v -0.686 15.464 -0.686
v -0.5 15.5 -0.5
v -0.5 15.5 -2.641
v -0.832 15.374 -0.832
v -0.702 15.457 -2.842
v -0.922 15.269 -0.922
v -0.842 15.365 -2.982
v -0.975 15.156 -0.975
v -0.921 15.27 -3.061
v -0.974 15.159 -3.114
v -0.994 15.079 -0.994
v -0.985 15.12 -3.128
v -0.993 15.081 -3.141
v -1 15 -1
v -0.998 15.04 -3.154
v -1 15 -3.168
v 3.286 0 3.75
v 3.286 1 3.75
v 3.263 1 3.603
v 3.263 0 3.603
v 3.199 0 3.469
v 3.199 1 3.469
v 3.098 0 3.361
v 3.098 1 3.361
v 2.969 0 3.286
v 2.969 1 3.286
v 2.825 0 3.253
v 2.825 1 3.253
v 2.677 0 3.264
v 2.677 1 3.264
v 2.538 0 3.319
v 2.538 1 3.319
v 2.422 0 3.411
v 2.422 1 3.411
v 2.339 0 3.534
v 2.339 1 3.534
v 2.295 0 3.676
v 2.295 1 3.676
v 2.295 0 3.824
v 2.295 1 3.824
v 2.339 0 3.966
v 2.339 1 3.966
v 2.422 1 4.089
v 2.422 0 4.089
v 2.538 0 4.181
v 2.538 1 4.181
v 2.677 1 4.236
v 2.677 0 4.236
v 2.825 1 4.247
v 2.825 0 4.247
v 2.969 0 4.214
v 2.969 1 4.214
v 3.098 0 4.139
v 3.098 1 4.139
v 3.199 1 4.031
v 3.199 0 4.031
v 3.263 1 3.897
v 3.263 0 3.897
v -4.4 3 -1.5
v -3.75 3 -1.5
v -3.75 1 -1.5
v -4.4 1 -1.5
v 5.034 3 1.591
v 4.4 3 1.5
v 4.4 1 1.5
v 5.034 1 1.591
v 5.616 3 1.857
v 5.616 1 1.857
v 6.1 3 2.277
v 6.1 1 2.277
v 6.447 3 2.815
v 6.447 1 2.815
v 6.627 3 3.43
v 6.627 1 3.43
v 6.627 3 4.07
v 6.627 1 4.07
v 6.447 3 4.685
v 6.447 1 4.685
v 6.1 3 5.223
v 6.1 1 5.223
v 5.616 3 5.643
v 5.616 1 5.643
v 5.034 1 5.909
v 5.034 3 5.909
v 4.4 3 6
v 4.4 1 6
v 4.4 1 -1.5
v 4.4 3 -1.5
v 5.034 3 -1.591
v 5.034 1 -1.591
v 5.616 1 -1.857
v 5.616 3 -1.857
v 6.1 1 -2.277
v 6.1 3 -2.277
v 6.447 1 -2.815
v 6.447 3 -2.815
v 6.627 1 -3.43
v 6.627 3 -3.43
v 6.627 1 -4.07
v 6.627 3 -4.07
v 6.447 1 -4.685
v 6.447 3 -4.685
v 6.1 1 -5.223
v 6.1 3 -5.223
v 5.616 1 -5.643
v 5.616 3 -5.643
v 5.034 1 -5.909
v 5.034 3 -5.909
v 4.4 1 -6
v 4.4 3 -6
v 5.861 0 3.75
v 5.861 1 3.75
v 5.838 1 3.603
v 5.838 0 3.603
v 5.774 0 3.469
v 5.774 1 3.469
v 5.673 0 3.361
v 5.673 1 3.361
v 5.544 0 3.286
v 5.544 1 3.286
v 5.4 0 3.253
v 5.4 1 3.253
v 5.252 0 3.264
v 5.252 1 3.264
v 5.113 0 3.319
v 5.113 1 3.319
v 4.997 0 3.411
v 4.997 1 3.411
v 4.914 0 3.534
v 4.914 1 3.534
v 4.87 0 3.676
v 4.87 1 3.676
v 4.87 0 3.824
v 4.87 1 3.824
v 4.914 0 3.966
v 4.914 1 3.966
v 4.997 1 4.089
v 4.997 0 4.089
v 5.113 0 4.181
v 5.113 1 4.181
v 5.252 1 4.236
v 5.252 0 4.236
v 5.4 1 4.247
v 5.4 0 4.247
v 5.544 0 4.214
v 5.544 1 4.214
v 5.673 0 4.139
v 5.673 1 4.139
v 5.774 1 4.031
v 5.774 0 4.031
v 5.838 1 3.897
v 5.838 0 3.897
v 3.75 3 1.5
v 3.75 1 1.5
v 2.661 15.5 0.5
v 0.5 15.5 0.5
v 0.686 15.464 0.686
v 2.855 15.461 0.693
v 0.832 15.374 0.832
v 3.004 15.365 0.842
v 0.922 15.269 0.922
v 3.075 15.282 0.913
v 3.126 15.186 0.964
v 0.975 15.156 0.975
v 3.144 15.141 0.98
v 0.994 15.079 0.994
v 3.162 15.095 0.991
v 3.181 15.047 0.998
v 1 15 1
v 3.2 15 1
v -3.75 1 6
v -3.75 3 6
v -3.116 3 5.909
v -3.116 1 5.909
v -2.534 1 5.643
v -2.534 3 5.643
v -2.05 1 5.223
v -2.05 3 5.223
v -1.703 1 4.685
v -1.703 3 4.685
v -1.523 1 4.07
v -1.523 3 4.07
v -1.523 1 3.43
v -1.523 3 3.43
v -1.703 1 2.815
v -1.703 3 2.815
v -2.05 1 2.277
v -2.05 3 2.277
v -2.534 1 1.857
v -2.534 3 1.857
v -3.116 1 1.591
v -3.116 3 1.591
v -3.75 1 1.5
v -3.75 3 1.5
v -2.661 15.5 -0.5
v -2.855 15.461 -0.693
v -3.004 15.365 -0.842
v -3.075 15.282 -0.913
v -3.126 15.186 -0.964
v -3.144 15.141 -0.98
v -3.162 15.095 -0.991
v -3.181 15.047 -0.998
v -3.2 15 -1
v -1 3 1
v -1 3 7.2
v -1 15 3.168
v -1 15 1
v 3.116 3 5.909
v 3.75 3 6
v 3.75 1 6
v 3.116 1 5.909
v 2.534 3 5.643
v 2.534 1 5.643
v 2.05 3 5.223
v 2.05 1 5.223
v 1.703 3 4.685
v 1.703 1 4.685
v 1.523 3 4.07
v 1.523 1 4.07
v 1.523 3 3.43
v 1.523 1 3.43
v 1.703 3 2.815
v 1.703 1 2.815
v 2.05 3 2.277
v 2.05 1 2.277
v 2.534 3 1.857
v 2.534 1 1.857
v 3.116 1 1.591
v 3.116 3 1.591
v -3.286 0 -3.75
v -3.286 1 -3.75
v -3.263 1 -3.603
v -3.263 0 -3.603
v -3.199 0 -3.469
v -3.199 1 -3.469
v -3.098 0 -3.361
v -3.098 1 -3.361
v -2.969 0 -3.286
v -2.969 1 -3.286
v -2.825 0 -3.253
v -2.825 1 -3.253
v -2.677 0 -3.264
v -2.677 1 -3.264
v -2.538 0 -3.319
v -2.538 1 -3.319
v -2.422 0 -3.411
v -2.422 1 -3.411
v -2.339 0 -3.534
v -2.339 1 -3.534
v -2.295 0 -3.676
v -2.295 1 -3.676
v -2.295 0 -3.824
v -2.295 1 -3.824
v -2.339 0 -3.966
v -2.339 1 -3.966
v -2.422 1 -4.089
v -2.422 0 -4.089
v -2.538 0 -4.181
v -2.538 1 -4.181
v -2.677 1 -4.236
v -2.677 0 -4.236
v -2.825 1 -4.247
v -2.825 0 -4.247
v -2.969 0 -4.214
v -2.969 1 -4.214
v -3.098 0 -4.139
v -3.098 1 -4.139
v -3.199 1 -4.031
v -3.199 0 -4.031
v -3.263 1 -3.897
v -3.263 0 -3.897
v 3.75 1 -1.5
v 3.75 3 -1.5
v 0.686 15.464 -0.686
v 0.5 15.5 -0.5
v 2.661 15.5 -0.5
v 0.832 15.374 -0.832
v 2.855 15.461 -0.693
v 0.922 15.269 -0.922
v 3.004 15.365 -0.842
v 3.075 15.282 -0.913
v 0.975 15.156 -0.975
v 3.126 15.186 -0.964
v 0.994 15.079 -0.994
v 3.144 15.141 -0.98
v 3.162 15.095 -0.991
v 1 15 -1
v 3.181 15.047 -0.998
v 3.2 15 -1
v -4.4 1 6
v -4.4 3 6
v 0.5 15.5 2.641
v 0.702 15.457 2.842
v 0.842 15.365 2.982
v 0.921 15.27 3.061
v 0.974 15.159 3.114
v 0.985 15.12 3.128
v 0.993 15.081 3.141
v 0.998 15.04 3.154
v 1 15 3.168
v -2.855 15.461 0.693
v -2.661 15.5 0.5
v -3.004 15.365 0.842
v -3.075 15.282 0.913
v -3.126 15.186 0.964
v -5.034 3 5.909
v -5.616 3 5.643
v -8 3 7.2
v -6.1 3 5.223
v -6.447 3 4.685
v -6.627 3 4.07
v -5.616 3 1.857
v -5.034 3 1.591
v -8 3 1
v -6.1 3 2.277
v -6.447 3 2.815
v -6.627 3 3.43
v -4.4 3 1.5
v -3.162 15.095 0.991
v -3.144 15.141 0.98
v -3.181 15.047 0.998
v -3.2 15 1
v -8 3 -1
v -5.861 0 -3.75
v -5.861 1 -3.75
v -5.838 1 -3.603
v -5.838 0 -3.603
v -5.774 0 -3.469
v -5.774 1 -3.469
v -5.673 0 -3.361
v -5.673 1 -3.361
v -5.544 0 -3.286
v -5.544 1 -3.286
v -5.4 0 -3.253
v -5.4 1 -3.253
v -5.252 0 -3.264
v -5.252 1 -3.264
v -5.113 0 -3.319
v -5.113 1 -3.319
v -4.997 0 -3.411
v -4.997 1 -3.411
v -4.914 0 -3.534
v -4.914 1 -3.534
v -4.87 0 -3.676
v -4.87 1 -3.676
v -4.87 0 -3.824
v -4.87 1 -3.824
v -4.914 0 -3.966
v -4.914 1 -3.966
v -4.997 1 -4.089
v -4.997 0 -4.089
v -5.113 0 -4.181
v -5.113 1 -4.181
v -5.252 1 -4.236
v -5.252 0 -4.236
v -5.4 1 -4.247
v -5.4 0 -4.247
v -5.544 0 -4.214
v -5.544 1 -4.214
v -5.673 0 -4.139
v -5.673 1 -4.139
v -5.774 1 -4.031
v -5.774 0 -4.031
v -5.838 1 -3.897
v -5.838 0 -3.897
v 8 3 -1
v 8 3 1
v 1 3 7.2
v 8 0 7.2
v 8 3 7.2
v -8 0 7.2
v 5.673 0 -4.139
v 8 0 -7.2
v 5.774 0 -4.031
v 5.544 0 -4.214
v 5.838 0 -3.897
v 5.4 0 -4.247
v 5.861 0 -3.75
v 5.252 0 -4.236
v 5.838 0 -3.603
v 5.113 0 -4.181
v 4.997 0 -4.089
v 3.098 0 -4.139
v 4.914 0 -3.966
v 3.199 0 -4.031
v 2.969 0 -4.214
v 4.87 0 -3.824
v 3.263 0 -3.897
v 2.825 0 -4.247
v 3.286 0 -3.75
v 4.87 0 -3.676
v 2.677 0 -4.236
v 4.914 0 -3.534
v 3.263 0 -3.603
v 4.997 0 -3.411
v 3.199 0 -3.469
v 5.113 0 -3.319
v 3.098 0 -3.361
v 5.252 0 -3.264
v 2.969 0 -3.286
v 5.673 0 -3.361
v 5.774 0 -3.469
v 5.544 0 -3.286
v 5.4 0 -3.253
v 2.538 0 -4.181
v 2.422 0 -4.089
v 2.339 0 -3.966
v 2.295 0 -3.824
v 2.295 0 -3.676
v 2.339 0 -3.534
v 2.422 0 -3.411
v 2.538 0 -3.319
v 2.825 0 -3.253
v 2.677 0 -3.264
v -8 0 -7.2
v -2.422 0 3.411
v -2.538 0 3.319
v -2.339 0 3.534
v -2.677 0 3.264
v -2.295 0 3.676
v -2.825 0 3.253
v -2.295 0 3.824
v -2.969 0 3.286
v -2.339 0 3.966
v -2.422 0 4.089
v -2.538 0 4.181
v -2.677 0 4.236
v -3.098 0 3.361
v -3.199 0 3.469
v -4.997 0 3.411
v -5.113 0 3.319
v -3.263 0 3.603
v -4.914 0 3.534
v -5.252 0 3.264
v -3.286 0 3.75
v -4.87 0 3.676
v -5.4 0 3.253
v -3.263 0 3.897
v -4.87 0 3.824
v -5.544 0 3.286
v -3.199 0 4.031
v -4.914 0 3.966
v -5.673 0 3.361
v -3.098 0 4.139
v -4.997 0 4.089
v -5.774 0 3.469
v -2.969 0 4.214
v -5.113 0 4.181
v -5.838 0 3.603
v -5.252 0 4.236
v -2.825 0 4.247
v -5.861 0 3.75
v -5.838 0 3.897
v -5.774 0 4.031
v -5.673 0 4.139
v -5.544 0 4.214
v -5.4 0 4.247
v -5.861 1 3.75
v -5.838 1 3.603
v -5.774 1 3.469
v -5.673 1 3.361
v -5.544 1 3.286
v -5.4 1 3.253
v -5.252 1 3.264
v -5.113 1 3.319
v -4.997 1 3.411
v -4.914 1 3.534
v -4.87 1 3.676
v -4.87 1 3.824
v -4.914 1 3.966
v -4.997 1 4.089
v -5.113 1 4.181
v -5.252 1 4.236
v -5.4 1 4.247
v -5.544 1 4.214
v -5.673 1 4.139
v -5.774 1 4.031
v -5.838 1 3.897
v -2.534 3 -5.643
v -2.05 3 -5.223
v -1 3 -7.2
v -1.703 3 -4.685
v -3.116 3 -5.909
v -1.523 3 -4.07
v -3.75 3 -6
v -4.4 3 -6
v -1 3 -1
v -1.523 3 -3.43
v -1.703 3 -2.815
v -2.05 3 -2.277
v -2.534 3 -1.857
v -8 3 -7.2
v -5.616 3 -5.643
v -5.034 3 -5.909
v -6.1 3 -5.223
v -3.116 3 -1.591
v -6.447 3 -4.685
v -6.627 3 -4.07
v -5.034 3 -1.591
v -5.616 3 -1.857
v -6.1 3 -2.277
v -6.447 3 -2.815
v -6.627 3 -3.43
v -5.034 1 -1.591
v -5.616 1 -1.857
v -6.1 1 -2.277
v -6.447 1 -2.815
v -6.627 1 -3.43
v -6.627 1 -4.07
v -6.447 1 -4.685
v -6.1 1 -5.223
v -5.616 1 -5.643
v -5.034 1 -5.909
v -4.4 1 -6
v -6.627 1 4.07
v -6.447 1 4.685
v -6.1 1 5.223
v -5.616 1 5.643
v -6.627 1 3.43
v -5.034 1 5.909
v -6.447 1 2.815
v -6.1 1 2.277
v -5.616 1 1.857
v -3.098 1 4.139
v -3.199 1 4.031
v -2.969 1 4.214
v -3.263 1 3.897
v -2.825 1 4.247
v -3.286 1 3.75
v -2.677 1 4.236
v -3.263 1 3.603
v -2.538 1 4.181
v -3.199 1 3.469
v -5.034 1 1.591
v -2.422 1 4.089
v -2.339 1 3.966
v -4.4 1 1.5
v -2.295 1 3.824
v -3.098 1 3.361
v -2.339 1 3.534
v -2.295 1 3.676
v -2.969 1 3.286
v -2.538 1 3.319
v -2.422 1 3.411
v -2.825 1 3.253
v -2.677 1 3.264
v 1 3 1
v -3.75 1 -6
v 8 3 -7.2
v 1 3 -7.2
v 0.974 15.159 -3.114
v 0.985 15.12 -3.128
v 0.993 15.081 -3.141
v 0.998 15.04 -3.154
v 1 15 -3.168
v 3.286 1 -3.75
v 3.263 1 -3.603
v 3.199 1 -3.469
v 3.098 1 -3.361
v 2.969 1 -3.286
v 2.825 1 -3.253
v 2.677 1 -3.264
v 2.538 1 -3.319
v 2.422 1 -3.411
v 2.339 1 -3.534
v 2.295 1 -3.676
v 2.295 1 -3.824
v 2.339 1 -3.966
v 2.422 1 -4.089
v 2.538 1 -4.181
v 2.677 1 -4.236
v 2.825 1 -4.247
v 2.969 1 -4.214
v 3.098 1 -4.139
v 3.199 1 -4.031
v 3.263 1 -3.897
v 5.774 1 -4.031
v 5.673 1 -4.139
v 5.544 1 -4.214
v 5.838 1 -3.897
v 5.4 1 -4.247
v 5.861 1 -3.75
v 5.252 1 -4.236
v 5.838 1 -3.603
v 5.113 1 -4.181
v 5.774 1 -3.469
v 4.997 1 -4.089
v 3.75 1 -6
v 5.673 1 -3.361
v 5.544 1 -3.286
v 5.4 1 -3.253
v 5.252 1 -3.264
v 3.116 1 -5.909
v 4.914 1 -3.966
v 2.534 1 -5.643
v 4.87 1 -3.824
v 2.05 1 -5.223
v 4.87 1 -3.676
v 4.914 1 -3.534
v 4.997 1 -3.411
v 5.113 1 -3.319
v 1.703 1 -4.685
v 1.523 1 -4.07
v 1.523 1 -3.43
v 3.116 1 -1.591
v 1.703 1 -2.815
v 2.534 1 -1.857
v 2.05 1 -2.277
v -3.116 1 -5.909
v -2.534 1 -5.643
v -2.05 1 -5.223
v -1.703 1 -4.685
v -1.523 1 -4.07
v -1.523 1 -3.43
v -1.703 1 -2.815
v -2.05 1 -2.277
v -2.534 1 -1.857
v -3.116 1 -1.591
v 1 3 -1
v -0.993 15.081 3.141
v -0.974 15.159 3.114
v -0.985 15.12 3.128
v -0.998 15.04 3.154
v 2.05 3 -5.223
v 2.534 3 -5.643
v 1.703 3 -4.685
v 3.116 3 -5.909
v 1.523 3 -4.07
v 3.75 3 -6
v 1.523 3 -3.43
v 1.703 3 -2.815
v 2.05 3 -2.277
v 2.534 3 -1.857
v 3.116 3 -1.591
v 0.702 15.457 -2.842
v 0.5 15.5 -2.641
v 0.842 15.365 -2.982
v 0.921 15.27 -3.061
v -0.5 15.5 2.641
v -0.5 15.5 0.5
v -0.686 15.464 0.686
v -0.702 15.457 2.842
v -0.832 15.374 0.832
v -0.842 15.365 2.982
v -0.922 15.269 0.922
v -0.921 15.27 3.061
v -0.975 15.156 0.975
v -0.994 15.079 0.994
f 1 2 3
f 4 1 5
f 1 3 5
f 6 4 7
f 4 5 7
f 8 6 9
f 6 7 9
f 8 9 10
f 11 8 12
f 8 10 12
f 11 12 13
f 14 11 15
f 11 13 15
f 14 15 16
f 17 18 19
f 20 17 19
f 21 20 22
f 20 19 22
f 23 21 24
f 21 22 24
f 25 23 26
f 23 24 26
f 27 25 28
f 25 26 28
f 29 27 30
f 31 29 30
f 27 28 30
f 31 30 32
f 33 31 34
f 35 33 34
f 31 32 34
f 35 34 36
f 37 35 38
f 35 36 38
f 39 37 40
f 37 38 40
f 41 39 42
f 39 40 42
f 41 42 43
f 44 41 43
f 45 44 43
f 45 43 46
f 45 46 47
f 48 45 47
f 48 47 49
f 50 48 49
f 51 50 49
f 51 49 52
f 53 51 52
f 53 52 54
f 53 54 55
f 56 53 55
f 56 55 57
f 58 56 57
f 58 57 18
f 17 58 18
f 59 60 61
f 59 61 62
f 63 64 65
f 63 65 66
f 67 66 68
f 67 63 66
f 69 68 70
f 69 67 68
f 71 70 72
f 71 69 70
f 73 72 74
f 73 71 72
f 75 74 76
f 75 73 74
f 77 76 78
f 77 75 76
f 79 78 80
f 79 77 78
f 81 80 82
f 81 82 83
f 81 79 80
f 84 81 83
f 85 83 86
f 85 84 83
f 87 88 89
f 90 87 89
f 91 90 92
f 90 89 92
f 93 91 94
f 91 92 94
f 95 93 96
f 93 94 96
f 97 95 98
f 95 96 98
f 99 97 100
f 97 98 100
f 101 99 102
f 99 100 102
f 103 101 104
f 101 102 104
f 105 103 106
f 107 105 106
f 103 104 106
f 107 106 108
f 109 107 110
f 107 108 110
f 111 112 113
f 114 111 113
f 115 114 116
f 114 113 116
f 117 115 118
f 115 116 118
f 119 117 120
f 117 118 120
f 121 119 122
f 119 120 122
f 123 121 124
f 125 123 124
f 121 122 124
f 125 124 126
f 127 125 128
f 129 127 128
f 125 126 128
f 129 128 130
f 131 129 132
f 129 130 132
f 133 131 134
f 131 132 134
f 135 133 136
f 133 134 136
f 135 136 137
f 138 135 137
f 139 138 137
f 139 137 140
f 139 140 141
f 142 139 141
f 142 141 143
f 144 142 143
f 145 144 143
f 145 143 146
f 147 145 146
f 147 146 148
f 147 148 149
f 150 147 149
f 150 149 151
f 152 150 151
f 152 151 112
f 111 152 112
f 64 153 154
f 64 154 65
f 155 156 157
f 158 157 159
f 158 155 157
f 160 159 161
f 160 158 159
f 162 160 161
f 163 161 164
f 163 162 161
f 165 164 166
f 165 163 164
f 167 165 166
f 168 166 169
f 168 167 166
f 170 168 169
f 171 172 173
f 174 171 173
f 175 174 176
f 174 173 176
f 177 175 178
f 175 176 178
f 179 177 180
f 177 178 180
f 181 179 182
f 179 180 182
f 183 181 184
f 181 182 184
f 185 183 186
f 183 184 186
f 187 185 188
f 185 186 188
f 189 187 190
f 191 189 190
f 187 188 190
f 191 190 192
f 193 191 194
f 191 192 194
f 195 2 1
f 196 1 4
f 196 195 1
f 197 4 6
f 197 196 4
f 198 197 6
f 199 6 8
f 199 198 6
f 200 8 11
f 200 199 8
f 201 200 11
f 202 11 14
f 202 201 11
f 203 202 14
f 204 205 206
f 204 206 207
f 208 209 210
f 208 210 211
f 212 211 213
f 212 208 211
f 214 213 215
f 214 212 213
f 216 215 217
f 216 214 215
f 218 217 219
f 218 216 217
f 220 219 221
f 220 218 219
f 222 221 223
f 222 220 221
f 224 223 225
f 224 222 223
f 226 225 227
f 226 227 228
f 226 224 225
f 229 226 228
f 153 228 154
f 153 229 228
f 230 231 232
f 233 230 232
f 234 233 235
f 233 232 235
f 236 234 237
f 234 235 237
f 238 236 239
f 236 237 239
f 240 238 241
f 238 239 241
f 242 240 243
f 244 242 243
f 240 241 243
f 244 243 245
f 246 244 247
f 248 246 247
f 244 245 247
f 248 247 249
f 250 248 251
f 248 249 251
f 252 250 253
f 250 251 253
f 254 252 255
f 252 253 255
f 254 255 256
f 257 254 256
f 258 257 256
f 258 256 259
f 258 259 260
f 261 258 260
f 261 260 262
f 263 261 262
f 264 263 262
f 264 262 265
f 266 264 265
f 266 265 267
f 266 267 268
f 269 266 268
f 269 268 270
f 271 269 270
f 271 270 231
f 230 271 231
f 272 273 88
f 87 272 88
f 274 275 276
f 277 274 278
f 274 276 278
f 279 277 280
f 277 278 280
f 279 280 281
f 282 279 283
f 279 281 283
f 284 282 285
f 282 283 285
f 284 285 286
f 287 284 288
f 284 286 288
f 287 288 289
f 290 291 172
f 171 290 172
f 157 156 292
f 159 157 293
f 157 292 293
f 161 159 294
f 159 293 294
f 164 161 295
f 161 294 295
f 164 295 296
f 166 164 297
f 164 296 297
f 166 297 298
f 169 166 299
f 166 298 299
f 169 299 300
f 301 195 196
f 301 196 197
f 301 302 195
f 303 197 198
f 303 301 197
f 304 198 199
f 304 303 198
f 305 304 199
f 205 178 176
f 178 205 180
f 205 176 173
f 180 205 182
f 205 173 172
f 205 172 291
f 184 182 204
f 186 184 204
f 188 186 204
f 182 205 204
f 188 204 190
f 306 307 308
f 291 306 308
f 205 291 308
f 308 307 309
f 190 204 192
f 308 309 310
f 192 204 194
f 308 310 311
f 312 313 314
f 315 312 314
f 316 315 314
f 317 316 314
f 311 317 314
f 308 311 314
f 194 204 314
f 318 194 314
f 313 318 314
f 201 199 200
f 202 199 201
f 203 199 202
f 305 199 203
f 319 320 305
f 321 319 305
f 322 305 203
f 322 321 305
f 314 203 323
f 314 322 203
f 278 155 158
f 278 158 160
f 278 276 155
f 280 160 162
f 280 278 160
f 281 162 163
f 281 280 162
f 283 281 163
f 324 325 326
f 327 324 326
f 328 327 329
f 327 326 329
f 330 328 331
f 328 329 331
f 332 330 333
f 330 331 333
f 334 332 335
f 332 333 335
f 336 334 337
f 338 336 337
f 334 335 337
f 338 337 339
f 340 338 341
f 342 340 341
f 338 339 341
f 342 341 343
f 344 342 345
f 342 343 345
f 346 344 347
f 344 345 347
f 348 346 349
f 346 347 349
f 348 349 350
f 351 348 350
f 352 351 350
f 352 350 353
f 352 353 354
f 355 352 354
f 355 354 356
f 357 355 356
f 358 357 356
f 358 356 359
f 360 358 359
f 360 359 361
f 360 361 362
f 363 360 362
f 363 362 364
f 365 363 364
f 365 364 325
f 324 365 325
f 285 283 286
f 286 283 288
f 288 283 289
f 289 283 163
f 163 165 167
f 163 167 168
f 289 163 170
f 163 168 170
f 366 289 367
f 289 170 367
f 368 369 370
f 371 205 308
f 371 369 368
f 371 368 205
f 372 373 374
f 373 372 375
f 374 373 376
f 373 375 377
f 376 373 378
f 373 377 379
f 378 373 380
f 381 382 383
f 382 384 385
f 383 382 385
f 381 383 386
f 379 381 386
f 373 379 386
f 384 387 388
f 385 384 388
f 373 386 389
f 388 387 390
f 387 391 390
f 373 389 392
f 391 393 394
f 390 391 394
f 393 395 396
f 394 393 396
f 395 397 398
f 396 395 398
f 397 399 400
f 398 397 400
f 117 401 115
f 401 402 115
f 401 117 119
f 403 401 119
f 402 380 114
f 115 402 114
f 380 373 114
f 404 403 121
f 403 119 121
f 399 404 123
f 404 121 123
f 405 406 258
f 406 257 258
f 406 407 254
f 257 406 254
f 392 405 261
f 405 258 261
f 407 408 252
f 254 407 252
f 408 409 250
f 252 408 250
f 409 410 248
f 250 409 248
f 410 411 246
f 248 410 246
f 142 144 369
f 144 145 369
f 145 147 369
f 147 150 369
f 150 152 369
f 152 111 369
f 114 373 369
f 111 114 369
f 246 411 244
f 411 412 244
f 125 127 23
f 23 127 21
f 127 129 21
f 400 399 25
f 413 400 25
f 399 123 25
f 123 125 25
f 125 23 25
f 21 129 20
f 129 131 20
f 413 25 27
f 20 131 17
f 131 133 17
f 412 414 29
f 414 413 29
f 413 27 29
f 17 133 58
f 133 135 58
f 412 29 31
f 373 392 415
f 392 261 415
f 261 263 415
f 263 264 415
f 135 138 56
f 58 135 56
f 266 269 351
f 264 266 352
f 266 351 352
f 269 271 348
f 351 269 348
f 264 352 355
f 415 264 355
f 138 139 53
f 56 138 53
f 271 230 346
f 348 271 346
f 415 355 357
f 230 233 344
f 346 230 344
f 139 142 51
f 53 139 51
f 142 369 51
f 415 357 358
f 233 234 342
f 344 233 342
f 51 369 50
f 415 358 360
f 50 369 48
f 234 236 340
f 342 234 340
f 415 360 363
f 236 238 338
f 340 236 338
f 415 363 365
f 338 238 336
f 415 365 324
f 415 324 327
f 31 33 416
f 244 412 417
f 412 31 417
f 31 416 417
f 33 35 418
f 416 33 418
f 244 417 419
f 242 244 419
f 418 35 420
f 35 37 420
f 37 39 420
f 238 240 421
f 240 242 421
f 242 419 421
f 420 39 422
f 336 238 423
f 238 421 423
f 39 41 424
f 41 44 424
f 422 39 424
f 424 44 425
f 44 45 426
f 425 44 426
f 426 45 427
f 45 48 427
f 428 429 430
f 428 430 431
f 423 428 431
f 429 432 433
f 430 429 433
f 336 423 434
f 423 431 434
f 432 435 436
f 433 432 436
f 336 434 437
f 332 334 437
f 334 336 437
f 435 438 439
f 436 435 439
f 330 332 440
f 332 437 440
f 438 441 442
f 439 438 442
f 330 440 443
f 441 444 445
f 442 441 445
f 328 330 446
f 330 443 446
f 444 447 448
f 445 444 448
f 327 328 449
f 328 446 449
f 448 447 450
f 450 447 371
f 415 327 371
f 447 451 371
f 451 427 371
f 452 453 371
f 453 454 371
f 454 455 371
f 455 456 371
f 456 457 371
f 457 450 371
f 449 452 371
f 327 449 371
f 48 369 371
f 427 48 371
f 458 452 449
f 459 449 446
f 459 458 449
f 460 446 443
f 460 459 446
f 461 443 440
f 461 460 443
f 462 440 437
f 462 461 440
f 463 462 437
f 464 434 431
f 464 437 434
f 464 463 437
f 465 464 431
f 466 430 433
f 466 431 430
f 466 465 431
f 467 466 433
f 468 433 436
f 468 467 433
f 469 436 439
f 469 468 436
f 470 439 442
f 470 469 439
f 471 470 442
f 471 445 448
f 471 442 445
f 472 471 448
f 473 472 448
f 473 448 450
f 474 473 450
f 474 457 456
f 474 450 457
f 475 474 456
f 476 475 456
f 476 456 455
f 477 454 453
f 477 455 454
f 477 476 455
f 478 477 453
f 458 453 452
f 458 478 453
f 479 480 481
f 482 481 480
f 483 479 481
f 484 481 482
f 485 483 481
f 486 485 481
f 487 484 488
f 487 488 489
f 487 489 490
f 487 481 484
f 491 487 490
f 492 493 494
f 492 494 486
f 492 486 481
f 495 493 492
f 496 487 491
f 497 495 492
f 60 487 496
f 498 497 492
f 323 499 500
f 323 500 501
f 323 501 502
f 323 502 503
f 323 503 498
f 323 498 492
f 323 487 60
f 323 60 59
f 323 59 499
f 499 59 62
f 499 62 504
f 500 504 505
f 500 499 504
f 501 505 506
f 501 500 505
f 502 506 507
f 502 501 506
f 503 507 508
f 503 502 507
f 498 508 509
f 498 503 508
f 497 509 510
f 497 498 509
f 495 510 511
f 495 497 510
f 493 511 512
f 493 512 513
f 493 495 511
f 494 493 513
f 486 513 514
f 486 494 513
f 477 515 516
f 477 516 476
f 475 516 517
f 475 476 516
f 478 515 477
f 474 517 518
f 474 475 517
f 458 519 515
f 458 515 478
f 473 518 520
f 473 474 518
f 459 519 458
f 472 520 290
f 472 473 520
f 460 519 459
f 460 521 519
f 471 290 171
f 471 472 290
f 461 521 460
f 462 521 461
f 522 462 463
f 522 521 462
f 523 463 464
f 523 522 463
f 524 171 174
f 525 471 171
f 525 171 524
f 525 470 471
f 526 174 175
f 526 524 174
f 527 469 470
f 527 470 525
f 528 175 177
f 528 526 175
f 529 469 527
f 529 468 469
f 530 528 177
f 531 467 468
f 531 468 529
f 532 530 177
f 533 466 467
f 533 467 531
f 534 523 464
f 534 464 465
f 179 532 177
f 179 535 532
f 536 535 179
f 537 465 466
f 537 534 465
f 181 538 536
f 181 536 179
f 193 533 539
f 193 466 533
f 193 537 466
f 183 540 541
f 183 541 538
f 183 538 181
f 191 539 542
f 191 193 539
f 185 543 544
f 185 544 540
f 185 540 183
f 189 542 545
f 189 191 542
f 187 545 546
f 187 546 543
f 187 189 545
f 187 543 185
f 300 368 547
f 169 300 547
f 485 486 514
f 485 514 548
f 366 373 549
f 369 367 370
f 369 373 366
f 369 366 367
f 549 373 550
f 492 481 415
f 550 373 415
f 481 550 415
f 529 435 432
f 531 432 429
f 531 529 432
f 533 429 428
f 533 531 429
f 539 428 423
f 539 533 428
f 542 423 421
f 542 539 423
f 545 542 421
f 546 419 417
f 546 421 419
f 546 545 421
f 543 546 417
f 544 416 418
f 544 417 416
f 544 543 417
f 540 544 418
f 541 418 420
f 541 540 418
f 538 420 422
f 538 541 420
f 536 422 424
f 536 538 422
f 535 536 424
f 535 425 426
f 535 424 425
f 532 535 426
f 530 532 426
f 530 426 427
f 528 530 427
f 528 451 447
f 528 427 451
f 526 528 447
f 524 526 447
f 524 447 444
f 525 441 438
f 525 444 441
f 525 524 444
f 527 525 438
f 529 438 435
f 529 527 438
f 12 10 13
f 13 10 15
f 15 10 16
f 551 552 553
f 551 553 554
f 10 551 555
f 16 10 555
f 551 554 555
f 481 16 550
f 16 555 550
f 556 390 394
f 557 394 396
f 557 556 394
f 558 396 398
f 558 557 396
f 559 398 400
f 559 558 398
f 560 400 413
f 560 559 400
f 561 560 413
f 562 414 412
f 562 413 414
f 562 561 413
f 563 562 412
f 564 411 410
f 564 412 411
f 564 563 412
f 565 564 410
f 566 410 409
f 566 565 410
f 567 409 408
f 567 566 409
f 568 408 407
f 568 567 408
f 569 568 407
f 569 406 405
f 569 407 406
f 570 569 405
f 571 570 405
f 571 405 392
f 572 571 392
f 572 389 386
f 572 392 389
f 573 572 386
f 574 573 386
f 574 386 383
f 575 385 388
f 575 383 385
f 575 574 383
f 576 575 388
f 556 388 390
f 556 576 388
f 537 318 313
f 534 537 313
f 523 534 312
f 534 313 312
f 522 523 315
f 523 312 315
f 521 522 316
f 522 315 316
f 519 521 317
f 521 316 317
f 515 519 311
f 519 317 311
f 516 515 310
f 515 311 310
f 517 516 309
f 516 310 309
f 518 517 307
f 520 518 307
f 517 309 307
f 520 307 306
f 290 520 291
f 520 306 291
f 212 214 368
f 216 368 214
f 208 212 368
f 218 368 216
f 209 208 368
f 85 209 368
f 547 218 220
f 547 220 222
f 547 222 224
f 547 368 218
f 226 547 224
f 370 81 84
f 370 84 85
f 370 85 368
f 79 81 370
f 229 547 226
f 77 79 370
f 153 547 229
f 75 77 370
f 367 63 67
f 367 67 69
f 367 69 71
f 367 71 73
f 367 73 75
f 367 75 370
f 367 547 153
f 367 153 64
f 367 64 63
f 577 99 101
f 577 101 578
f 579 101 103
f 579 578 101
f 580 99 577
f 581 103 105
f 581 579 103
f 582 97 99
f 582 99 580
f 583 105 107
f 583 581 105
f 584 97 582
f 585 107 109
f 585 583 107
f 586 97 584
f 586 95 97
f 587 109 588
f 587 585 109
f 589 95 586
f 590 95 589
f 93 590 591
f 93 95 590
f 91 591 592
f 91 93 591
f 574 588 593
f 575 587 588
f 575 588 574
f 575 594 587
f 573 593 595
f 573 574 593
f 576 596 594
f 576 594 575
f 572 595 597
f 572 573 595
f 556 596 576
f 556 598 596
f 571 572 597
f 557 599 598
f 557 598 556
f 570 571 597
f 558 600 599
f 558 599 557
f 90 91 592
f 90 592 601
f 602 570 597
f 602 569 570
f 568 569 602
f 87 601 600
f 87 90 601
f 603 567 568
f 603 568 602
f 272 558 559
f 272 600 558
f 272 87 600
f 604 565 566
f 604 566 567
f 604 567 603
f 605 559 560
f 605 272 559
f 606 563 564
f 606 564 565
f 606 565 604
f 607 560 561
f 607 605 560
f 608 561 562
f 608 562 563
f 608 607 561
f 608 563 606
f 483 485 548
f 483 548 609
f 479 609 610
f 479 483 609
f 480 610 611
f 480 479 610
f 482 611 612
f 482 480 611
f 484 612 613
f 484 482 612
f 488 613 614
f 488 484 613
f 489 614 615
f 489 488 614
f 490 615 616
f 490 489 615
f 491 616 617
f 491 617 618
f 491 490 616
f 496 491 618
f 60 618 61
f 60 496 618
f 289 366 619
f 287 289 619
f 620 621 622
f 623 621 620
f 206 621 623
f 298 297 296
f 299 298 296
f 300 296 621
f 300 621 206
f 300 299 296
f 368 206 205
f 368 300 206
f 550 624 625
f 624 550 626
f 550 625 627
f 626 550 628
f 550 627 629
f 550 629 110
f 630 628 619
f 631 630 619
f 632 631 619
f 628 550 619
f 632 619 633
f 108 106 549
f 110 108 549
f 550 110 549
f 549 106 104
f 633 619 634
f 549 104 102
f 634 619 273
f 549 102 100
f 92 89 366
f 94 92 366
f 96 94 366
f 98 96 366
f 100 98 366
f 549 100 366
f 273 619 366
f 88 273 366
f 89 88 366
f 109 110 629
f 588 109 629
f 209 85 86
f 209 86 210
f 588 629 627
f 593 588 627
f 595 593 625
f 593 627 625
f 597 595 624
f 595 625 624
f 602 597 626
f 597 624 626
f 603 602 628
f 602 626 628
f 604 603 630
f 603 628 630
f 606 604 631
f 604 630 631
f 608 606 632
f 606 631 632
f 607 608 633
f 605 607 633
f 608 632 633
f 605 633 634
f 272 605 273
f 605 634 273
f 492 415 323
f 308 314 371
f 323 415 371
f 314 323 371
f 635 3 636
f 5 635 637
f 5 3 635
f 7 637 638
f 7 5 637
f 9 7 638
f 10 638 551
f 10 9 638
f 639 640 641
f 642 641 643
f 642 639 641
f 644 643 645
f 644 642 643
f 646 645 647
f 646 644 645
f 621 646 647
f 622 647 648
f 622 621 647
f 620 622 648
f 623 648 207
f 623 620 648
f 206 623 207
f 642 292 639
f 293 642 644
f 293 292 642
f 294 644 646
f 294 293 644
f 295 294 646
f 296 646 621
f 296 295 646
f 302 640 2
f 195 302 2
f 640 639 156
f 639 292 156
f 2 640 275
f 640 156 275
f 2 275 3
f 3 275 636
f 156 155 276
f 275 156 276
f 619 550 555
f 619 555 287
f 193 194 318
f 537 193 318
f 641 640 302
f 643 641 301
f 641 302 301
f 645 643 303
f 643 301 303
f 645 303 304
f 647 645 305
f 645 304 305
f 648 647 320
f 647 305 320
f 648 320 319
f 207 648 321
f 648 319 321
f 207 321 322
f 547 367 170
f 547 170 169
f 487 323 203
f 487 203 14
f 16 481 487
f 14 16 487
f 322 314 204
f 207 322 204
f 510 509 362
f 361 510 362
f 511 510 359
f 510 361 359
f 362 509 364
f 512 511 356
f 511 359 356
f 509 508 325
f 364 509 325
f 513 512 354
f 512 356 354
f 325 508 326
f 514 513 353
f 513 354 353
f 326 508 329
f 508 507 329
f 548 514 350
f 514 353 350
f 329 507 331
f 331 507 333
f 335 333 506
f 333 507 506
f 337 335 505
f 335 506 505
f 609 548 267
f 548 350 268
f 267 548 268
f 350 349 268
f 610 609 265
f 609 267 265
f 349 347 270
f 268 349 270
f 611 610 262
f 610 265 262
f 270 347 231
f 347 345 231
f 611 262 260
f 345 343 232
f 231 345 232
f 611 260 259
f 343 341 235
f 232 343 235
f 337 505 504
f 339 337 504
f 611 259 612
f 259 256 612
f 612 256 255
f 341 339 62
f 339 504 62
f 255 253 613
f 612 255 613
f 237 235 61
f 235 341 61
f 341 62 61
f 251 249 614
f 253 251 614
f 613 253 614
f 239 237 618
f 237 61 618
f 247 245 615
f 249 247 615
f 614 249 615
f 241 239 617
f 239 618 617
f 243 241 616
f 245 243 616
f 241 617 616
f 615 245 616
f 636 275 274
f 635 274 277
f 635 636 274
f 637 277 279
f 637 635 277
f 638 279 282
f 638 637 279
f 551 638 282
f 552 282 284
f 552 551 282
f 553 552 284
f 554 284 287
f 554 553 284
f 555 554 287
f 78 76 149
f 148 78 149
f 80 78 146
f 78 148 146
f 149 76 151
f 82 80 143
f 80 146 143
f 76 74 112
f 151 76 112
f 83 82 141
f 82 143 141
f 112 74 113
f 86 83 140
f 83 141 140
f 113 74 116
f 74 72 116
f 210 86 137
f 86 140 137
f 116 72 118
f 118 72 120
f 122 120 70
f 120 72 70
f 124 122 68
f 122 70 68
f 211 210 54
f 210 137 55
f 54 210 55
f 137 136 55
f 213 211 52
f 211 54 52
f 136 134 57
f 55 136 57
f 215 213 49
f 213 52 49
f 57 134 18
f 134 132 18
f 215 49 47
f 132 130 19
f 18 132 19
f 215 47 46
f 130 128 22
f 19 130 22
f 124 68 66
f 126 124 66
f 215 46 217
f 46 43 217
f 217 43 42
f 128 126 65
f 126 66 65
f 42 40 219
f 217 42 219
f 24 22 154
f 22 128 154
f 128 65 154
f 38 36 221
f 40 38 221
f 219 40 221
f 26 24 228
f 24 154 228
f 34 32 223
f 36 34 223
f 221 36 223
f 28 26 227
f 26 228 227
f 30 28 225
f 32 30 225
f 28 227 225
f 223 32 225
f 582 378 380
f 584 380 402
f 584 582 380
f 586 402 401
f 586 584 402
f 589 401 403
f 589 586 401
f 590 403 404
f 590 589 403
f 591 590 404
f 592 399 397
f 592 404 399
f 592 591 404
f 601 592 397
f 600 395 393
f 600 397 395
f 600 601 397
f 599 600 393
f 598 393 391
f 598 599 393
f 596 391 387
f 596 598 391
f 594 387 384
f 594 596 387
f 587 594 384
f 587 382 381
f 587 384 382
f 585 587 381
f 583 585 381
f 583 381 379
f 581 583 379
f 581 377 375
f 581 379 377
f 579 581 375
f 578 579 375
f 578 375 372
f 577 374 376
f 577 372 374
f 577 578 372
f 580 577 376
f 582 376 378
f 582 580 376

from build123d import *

# Parameters (mm, degrees)
SKETCH1_W                = 8
SKETCH1_H                = 7.2
BOSS_EXTRUDE1_DEPTH      = 3
CUT_EXTRUDE1_DEPTH       = 2
SKETCH3_R                = 0.49811532
CUT_EXTRUDE2_DEPTH       = 2
BOSS_EXTRUDE2_DEPTH      = 1
BOSS_EXTRUDE3_DEPTH      = 1
MIRROR22_COPY_1_SKETCH_W = 8
MIRROR22_COPY_1_SKETCH_H = 7.2
MIRROR22_COPY_1_DEPTH    = 3
MIRROR22_COPY_2_DEPTH    = 2
MIRROR22_COPY_3_SKETCH_R = 0.49811532
MIRROR22_COPY_3_DEPTH    = 2
MIRROR22_COPY_4_DEPTH    = 1
MIRROR22_COPY_5_DEPTH    = 1
MIRROR22_COPY_6_DEPTH    = 1
MIRROR22_COPY_7_DEPTH    = 1
FILLET6_R                = 0.5


with BuildPart() as part:
    # Sketch1 → Boss-Extrude1 (new body)
    with BuildSketch(Plane(origin=(0, 0, 0), x_dir=(1, 0, 0), z_dir=(0, 1, 0))):
        with Locations((4, -3.6)):
            Rectangle(SKETCH1_W, SKETCH1_H)
    boss_extrude1 = extrude(amount=BOSS_EXTRUDE1_DEPTH)

    # Sketch2 → Cut-Extrude1 (cut)
    with BuildSketch(Plane(origin=(0, 3, 0), x_dir=(1, 0, 0), z_dir=(0, 1, 0))):
        with BuildLine():
            Line((3.75, -1.5), (4.4, -1.5))
            ThreePointArc((4.4, -1.5), (6.65, -3.75), (4.4, -6))
            Line((4.4, -6), (3.75, -6))
            ThreePointArc((3.75, -6), (1.5, -3.75), (3.75, -1.5))
        make_face()
    cut_extrude1 = extrude(amount=-CUT_EXTRUDE1_DEPTH, mode=Mode.SUBTRACT)

    # Sketch3 → Cut-Extrude2 (cut, through all)
    with BuildSketch(Plane(origin=(0, 1, 0), x_dir=(1, 0, 0), z_dir=(0, 1, 0))):
        with Locations((2.7875, -3.75)):
            Circle(SKETCH3_R)
        with Locations((5.3625, -3.75)):
            Circle(SKETCH3_R)
    cut_extrude2 = extrude(amount=-CUT_EXTRUDE2_DEPTH, mode=Mode.SUBTRACT)

    # Sketch4 → Boss-Extrude2 (add)
    with BuildSketch(Plane.ZY):
        Polygon((0, 3), (0, 15.5), (3, 15.5), (7.2, 3), align=None)
    boss_extrude2 = extrude(amount=-BOSS_EXTRUDE2_DEPTH)

    # Sketch7 → Boss-Extrude3 (add)
    with BuildSketch(Plane(origin=(0, 0, 0), x_dir=(-1, 0, 0), z_dir=(0, 0, -1))):
        Polygon((0, 15.5), (-3, 15.5), (-8, 3), (0, 3), align=None)
    boss_extrude3 = extrude(amount=-BOSS_EXTRUDE3_DEPTH)

    # Mirror16: Boss-Extrude1, Cut-Extrude1, Cut-Extrude2, Boss-Extrude2, Boss-Extrude3 across plane
    add(boss_extrude1.mirror(Plane(origin=(0, 3, 0), x_dir=(0, 0, 1), z_dir=(1, 0, 0))))
    add(cut_extrude1.mirror(Plane(origin=(0, 3, 0), x_dir=(0, 0, 1), z_dir=(1, 0, 0))), mode=Mode.SUBTRACT)
    add(cut_extrude2.mirror(Plane(origin=(0, 3, 0), x_dir=(0, 0, 1), z_dir=(1, 0, 0))), mode=Mode.SUBTRACT)
    add(boss_extrude2.mirror(Plane(origin=(0, 3, 0), x_dir=(0, 0, 1), z_dir=(1, 0, 0))))
    add(boss_extrude3.mirror(Plane(origin=(0, 3, 0), x_dir=(0, 0, 1), z_dir=(1, 0, 0))))

    # Mirror21: Boss-Extrude1, Cut-Extrude1, Cut-Extrude2, Boss-Extrude2, Boss-Extrude3 across plane
    add(boss_extrude1.mirror(Plane(origin=(0, 3, 0), x_dir=(1, 0, 0), z_dir=(0, 0, 1))))
    add(cut_extrude1.mirror(Plane(origin=(0, 3, 0), x_dir=(1, 0, 0), z_dir=(0, 0, 1))), mode=Mode.SUBTRACT)
    add(cut_extrude2.mirror(Plane(origin=(0, 3, 0), x_dir=(1, 0, 0), z_dir=(0, 0, 1))), mode=Mode.SUBTRACT)
    add(boss_extrude2.mirror(Plane(origin=(0, 3, 0), x_dir=(1, 0, 0), z_dir=(0, 0, 1))))
    add(boss_extrude3.mirror(Plane(origin=(0, 3, 0), x_dir=(1, 0, 0), z_dir=(0, 0, 1))))

    # Mirror22: Boss-Extrude1, Cut-Extrude1, Cut-Extrude2 across plane
    add(boss_extrude1.mirror(Plane(origin=(0, 3, 0), x_dir=(0, 0, 1), z_dir=(-1, 0, 0))))
    add(cut_extrude1.mirror(Plane(origin=(0, 3, 0), x_dir=(0, 0, 1), z_dir=(-1, 0, 0))), mode=Mode.SUBTRACT)
    add(cut_extrude2.mirror(Plane(origin=(0, 3, 0), x_dir=(0, 0, 1), z_dir=(-1, 0, 0))), mode=Mode.SUBTRACT)

    # Mirror22 copy 1 sketch → Mirror22 copy 1 (add)
    with BuildSketch(Plane(origin=(0, 0, 0), x_dir=(-1, 0, 0), z_dir=(0, 1, 0))):
        with Locations((4, -3.6)):
            Rectangle(MIRROR22_COPY_1_SKETCH_W, MIRROR22_COPY_1_SKETCH_H)
    extrude(amount=MIRROR22_COPY_1_DEPTH)

    # Mirror22 copy 2 sketch → Mirror22 copy 2 (cut)
    with BuildSketch(Plane(origin=(0, 3, 0), x_dir=(-1, 0, 0), z_dir=(0, 1, 0))):
        with BuildLine():
            Line((3.75, -1.5), (4.4, -1.5))
            ThreePointArc((4.4, -1.5), (6.65, -3.75), (4.4, -6))
            Line((4.4, -6), (3.75, -6))
            ThreePointArc((3.75, -6), (1.5, -3.75), (3.75, -1.5))
        make_face()
    extrude(amount=-MIRROR22_COPY_2_DEPTH, mode=Mode.SUBTRACT)

    # Mirror22 copy 3 sketch → Mirror22 copy 3 (cut, through all)
    with BuildSketch(Plane(origin=(0, 1, 0), x_dir=(-1, 0, 0), z_dir=(0, 1, 0))):
        with Locations((2.7875, -3.75)):
            Circle(MIRROR22_COPY_3_SKETCH_R)
        with Locations((5.3625, -3.75)):
            Circle(MIRROR22_COPY_3_SKETCH_R)
    extrude(amount=-MIRROR22_COPY_3_DEPTH, mode=Mode.SUBTRACT)

    # Mirror22 copy 4 sketch → Mirror22 copy 4 (add)
    with BuildSketch(Plane(origin=(0, 0, 0), x_dir=(0, 0, -1), z_dir=(1, 0, 0))):
        Polygon((0, 3), (0, 15.5), (3, 15.5), (7.2, 3), align=None)
    extrude(amount=-MIRROR22_COPY_4_DEPTH)

    # Mirror22 copy 5 sketch → Mirror22 copy 5 (add)
    with BuildSketch(Plane.XY):
        Polygon((0, 15.5), (-3, 15.5), (-8, 3), (0, 3), align=None)
    extrude(amount=-MIRROR22_COPY_5_DEPTH)

    # Mirror22 copy 6 sketch → Mirror22 copy 6 (add)
    with BuildSketch(Plane(origin=(0, 0, 0), x_dir=(0, 0, 1), z_dir=(1, 0, 0))):
        Polygon((0, -3), (0, -15.5), (3, -15.5), (7.2, -3), align=None)
    extrude(amount=-MIRROR22_COPY_6_DEPTH)

    # Mirror22 copy 7 sketch → Mirror22 copy 7 (add)
    with BuildSketch(Plane(origin=(0, 0, 0), x_dir=(1, 0, 0), z_dir=(0, 0, -1))):
        Polygon((0, -15.5), (-3, -15.5), (-8, -3), (0, -3), align=None)
    extrude(amount=-MIRROR22_COPY_7_DEPTH)

    # Fillet6
    fillet6_edges = [part.edges().sort_by_distance(p)[0] for p in [
        (-1, 15.5, 2),
        (-2, 15.5, 1),
        (-3, 15.5, 0),
        (0, 15.5, -3),
        (1, 15.5, -2),
        (2, 15.5, -1),
        (-1, 15.5, -2),
        (-2, 15.5, -1),
        (1, 15.5, 2),
        (0, 15.5, 3),
        (2, 15.5, 1),
        (3, 15.5, 0),
    ]]
    fillet(fillet6_edges, radius=FILLET6_R)


solid = part.part
